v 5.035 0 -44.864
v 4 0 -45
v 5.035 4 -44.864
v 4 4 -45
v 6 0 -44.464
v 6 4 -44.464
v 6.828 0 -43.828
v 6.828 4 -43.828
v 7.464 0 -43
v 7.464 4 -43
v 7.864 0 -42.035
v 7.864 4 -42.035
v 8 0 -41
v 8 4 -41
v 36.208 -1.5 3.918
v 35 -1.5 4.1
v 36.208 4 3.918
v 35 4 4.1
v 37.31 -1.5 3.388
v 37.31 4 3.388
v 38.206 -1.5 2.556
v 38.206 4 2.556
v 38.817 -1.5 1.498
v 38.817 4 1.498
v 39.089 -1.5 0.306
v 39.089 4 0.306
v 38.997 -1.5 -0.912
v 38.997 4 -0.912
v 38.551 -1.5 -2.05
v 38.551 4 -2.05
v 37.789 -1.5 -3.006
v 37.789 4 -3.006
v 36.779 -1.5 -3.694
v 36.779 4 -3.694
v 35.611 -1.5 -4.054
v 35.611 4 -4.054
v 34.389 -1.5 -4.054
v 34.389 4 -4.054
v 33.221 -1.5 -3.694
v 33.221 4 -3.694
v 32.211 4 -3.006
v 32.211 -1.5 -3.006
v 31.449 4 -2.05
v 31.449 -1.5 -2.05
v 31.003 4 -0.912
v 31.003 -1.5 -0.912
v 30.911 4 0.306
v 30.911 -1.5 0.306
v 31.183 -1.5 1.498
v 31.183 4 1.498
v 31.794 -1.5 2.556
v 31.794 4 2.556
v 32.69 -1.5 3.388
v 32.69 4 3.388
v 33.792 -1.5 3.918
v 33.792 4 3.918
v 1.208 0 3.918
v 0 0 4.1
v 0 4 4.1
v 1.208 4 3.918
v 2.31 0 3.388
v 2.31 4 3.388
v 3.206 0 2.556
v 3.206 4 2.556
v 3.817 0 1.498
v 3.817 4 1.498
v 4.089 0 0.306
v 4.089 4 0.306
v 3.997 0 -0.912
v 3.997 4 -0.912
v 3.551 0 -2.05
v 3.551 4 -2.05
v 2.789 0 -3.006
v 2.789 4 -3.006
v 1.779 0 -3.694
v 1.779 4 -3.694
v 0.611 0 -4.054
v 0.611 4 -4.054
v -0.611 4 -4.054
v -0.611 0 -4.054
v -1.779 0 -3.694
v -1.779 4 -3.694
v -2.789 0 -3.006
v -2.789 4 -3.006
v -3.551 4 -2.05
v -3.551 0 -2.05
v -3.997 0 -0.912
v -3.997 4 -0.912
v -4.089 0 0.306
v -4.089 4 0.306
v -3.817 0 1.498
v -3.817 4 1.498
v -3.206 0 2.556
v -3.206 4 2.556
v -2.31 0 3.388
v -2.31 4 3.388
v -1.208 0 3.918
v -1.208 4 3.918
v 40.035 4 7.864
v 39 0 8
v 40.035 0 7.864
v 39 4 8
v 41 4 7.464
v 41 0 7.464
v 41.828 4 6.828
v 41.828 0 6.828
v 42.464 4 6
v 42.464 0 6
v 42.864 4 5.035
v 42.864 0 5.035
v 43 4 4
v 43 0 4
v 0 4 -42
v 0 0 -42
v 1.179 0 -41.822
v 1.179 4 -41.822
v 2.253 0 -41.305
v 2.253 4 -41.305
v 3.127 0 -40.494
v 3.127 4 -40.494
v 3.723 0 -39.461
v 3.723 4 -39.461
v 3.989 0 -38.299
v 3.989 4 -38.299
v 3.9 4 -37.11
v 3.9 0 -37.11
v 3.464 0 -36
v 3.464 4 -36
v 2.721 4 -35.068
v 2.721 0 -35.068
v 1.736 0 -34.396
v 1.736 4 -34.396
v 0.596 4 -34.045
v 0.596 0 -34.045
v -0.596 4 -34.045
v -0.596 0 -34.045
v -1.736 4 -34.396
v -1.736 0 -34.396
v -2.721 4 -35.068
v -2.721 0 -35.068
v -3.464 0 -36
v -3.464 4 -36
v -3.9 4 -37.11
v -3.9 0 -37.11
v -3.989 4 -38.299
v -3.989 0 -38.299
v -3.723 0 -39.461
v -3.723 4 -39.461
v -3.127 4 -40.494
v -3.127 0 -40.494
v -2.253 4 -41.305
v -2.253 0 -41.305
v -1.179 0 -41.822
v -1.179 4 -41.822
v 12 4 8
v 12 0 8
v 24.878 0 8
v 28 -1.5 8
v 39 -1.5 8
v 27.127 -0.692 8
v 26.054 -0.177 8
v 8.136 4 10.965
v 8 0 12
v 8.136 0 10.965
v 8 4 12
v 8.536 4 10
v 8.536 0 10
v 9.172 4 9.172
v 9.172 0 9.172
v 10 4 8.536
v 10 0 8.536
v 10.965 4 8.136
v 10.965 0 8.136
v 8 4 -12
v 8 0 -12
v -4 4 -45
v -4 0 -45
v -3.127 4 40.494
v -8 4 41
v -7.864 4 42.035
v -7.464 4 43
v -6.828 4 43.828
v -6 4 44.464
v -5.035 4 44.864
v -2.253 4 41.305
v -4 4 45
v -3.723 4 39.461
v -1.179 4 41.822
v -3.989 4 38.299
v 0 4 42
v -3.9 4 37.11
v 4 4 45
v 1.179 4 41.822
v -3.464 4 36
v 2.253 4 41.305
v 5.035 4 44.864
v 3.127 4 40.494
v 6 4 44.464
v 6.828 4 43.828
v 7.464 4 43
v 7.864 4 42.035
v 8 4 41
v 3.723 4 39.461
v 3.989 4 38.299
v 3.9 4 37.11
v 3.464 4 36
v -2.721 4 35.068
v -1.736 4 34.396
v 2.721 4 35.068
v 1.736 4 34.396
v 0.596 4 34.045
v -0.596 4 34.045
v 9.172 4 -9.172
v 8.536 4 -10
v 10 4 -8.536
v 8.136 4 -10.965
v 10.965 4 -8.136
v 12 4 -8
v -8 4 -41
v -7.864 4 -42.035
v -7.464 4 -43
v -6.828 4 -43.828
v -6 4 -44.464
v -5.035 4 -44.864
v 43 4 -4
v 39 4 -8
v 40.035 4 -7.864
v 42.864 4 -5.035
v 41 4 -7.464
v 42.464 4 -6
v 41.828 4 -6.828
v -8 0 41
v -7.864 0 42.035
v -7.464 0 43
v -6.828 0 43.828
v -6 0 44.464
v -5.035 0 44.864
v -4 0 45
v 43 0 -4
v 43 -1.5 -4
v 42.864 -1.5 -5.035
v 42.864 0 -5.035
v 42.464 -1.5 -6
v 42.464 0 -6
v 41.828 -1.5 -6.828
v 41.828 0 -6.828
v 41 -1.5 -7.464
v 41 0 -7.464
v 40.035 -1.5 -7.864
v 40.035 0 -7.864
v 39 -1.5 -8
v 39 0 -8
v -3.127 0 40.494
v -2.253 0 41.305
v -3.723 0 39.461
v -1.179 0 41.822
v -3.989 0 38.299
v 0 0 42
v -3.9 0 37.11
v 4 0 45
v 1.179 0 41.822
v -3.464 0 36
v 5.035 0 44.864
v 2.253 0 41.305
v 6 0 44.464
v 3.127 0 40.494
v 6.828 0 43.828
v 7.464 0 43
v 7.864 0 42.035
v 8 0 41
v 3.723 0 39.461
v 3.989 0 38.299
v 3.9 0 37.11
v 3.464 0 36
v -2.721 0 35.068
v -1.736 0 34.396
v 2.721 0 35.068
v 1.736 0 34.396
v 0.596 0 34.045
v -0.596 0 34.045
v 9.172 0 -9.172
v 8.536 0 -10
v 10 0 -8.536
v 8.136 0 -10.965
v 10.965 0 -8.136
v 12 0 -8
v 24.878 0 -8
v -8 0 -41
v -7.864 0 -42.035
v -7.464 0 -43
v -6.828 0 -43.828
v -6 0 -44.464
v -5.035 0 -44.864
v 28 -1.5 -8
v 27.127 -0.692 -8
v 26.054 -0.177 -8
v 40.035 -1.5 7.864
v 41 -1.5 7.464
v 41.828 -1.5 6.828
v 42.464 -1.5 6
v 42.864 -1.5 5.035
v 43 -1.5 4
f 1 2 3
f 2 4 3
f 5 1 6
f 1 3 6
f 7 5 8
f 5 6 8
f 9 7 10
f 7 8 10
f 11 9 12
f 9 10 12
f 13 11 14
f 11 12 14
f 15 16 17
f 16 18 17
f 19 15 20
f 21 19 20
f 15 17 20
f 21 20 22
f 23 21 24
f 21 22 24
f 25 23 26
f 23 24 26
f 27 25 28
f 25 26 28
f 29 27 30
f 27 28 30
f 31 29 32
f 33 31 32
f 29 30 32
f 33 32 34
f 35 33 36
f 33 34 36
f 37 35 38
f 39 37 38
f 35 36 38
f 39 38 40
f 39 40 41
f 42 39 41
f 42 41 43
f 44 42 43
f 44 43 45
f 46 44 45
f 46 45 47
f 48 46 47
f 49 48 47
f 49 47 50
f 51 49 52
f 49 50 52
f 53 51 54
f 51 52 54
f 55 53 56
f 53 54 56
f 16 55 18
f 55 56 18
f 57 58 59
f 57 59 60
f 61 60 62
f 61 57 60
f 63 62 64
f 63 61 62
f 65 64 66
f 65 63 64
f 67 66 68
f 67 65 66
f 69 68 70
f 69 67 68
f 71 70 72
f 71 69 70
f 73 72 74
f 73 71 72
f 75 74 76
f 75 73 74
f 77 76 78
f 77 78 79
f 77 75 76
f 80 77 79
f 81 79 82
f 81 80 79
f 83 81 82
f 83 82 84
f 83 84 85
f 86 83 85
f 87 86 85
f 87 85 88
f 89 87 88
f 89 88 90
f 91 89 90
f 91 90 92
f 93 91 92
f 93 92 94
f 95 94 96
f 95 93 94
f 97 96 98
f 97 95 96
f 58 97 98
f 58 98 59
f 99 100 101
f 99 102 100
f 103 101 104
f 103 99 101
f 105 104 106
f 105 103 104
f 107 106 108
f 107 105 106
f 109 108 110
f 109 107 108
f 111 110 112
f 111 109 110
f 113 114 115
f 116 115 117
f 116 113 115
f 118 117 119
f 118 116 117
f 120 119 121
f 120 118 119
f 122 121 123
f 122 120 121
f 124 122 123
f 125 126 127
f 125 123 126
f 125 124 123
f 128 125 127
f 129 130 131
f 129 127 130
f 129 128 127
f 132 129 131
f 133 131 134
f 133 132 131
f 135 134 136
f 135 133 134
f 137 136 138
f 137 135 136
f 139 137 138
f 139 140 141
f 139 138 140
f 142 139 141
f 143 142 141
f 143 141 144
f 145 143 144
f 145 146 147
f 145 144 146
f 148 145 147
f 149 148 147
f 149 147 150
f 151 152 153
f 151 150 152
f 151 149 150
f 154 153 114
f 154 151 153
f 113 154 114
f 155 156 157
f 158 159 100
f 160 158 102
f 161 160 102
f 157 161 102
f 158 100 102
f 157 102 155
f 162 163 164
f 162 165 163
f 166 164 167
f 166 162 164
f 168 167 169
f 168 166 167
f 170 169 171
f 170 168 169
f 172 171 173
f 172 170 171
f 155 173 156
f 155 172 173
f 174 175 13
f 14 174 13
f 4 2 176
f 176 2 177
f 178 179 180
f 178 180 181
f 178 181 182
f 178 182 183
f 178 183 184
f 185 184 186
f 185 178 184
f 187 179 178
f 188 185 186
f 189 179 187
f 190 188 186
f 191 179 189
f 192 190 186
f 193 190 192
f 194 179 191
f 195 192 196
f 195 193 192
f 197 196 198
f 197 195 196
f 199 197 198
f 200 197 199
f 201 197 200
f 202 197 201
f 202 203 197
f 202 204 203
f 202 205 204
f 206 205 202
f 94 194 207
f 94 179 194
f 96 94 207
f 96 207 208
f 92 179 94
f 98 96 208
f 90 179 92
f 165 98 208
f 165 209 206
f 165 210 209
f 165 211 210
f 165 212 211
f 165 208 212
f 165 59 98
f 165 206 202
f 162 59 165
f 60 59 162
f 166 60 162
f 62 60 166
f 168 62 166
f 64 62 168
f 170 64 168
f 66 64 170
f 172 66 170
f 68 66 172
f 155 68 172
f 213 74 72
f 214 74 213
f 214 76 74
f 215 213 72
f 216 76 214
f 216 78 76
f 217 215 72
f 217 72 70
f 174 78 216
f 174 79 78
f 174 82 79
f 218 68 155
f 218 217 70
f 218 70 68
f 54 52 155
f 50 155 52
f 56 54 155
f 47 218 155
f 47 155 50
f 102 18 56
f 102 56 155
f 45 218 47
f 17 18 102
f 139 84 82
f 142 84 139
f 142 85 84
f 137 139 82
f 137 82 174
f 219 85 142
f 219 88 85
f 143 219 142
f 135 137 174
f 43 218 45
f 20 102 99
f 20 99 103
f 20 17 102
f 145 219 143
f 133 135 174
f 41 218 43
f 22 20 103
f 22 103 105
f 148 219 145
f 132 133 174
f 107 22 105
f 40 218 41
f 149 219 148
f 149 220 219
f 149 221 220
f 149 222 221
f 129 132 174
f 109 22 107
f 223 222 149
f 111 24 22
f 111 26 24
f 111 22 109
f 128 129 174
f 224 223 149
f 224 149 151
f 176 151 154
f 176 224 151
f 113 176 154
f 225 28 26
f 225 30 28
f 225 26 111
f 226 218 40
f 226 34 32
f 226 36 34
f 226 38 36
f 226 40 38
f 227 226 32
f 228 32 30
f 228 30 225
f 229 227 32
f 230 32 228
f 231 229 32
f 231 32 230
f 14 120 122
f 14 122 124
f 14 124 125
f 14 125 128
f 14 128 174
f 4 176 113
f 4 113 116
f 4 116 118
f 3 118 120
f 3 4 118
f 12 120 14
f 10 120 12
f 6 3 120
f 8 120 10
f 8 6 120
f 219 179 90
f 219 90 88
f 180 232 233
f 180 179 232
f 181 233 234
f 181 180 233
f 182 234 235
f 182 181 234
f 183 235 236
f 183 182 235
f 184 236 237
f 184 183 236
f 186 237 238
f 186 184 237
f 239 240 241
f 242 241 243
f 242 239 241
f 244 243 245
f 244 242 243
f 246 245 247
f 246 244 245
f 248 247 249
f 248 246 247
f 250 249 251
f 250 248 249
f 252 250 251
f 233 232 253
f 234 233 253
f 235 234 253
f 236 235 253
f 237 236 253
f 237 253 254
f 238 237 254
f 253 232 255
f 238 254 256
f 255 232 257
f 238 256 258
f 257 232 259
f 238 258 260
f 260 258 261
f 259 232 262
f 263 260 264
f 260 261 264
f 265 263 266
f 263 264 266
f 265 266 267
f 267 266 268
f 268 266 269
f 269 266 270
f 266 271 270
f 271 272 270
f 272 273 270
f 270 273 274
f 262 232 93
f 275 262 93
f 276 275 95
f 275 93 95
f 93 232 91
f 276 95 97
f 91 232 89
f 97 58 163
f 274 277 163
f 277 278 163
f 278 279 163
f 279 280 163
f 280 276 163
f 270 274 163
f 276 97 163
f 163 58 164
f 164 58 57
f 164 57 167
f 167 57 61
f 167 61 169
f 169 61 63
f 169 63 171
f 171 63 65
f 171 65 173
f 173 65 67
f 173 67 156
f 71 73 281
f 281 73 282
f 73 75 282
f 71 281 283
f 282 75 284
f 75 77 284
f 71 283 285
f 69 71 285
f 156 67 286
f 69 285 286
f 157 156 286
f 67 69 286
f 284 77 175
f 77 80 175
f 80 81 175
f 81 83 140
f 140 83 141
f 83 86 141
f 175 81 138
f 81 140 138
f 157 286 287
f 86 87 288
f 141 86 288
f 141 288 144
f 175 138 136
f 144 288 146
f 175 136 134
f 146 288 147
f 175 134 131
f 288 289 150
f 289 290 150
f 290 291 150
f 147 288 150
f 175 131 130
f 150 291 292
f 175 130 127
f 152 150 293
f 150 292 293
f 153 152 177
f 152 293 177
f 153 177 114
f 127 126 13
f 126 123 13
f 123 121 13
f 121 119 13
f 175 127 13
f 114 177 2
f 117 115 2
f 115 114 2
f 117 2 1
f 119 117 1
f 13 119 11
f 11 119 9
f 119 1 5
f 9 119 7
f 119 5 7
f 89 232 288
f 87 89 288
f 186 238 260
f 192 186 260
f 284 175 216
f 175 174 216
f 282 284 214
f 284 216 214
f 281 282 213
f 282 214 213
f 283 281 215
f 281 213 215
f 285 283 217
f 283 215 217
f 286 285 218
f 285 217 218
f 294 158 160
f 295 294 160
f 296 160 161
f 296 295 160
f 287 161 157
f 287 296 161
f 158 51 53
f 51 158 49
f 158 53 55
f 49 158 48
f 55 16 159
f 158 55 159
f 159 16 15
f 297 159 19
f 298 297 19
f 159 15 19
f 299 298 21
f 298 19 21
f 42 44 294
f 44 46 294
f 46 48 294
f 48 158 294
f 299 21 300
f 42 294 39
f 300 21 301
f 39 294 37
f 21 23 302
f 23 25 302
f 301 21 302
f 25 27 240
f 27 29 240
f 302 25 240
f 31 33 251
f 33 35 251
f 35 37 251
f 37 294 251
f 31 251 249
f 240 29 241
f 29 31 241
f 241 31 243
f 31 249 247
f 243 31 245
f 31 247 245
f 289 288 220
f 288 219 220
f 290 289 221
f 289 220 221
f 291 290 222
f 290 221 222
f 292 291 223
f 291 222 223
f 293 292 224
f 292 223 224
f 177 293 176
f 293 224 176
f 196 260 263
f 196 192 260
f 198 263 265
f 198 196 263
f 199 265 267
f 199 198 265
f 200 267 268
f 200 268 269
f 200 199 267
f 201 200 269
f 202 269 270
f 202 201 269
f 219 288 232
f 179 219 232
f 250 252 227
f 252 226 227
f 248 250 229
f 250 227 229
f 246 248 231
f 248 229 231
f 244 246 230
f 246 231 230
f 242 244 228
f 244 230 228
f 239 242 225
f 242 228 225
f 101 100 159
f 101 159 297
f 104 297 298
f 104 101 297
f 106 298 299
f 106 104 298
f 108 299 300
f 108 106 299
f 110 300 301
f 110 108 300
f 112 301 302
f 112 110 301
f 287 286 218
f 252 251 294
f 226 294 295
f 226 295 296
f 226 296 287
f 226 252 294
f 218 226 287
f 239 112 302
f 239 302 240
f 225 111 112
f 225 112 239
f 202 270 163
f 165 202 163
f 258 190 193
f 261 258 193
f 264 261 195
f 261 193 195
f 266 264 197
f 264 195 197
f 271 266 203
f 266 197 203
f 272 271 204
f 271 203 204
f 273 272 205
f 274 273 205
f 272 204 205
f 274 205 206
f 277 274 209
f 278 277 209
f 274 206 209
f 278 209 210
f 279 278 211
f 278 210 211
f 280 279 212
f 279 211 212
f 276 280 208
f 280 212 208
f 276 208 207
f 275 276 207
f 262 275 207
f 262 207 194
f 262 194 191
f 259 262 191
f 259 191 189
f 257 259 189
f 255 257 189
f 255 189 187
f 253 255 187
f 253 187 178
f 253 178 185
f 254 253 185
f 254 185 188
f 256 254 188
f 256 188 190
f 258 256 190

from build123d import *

# Parameters (mm, degrees)
SKETCH1_R           = 4.1
BOSS_EXTRUDE1_DEPTH = 4
SKETCH2_R           = 4
CUT_EXTRUDE1_DEPTH  = 10
FILLET1_R           = 4
SKETCH3_R           = 4.1
CUT_EXTRUDE2_DEPTH  = 10
SKETCH4_R           = 4.1
BOSS_EXTRUDE3_DEPTH = 1.5
FILLET3_R           = 4


with BuildPart() as part:
    # Sketch1 → Boss-Extrude1 (new body)
    with BuildSketch(Plane(origin=(0, 0, 0), x_dir=(1, 0, 0), z_dir=(0, 1, 0))):
        Polygon((-8, 45), (-8, -45), (8, -45), (8, -8), (43, -8), (43, 8), (8, 8), (8, 45), align=None)
        with Locations(Location((0, 0, 0), (0, 0, 270))):
            Circle(SKETCH1_R, mode=Mode.SUBTRACT)
    extrude(amount=BOSS_EXTRUDE1_DEPTH)

    # Sketch2 → Cut-Extrude1 (cut)
    with BuildSketch(Plane(origin=(0, 4, 0), x_dir=(1, 0, 0), z_dir=(0, 1, 0))):
        with Locations(Location((0, -38, 0), (0, 0, 270))):
            Circle(SKETCH2_R)
    cut_extrude1 = extrude(amount=-CUT_EXTRUDE1_DEPTH, mode=Mode.SUBTRACT)

    # Mirror1: Cut-Extrude1 across plane
    add(cut_extrude1.mirror(Plane.XY), mode=Mode.SUBTRACT)

    # Fillet1
    fillet1_edges = [part.edges().sort_by_distance(p)[0] for p in [
        (43, 2, -8),
        (43, 2, 8),
        (8, 2, 8),
        (8, 2, 45),
        (-8, 2, 45),
        (-8, 2, -45),
        (8, 2, -45),
        (8, 2, -8),
    ]]
    fillet(fillet1_edges, radius=FILLET1_R)

    # Sketch3 → Cut-Extrude2 (cut)
    with BuildSketch(Plane(origin=(0, 4, 0), x_dir=(1, 0, 0), z_dir=(0, 1, 0))):
        with Locations(Location((35, 0, 0), (0, 0, 270))):
            Circle(SKETCH3_R)
    extrude(amount=-CUT_EXTRUDE2_DEPTH, mode=Mode.SUBTRACT)

    # Sketch4 → Boss-Extrude3 (add)
    with BuildSketch(Plane(origin=(0, 0, 0), x_dir=(1, 0, 0), z_dir=(0, 1, 0))):
        with BuildLine():
            Line((39, 8), (28, 8))
            Line((28, 8), (28, -8))
            Line((28, -8), (39, -8))
            ThreePointArc((39, -8), (41.828427125, -6.828427125), (43, -4))
            Line((43, -4), (43, 4))
            ThreePointArc((43, 4), (41.828427125, 6.828427125), (39, 8))
        make_face()
        with Locations(Location((35, 0, 0), (0, 0, 270))):
            Circle(SKETCH4_R, mode=Mode.SUBTRACT)
    extrude(amount=-BOSS_EXTRUDE3_DEPTH)

    # Fillet3
    # the kernel refuses this fillet: 4 mm, written as the material it adds along each edge
    with BuildSketch(Plane(origin=(28, 0, -8), x_dir=(0, -1, 0), z_dir=(0, 0, 1))) as fillet3_piece_1:
        with BuildLine():
            CenterArc((4, -3.122498999), FILLET3_R, 128.682187453, 51.317812547)
            Line((0, -3.122498999), (-0.08, -3.122498999))
            Line((-0.08, -3.122498999), (-0.08, 0))
            Line((-0.08, 0), (0, 0.08))
            ThreePointArc((0, 0.08), (0.75, 0.08), (1.45, 0.06244998))
            Line((1.45, 0.06244998), (1.5, 0))
        make_face()
    extrude(amount=16)


solid = part.part
